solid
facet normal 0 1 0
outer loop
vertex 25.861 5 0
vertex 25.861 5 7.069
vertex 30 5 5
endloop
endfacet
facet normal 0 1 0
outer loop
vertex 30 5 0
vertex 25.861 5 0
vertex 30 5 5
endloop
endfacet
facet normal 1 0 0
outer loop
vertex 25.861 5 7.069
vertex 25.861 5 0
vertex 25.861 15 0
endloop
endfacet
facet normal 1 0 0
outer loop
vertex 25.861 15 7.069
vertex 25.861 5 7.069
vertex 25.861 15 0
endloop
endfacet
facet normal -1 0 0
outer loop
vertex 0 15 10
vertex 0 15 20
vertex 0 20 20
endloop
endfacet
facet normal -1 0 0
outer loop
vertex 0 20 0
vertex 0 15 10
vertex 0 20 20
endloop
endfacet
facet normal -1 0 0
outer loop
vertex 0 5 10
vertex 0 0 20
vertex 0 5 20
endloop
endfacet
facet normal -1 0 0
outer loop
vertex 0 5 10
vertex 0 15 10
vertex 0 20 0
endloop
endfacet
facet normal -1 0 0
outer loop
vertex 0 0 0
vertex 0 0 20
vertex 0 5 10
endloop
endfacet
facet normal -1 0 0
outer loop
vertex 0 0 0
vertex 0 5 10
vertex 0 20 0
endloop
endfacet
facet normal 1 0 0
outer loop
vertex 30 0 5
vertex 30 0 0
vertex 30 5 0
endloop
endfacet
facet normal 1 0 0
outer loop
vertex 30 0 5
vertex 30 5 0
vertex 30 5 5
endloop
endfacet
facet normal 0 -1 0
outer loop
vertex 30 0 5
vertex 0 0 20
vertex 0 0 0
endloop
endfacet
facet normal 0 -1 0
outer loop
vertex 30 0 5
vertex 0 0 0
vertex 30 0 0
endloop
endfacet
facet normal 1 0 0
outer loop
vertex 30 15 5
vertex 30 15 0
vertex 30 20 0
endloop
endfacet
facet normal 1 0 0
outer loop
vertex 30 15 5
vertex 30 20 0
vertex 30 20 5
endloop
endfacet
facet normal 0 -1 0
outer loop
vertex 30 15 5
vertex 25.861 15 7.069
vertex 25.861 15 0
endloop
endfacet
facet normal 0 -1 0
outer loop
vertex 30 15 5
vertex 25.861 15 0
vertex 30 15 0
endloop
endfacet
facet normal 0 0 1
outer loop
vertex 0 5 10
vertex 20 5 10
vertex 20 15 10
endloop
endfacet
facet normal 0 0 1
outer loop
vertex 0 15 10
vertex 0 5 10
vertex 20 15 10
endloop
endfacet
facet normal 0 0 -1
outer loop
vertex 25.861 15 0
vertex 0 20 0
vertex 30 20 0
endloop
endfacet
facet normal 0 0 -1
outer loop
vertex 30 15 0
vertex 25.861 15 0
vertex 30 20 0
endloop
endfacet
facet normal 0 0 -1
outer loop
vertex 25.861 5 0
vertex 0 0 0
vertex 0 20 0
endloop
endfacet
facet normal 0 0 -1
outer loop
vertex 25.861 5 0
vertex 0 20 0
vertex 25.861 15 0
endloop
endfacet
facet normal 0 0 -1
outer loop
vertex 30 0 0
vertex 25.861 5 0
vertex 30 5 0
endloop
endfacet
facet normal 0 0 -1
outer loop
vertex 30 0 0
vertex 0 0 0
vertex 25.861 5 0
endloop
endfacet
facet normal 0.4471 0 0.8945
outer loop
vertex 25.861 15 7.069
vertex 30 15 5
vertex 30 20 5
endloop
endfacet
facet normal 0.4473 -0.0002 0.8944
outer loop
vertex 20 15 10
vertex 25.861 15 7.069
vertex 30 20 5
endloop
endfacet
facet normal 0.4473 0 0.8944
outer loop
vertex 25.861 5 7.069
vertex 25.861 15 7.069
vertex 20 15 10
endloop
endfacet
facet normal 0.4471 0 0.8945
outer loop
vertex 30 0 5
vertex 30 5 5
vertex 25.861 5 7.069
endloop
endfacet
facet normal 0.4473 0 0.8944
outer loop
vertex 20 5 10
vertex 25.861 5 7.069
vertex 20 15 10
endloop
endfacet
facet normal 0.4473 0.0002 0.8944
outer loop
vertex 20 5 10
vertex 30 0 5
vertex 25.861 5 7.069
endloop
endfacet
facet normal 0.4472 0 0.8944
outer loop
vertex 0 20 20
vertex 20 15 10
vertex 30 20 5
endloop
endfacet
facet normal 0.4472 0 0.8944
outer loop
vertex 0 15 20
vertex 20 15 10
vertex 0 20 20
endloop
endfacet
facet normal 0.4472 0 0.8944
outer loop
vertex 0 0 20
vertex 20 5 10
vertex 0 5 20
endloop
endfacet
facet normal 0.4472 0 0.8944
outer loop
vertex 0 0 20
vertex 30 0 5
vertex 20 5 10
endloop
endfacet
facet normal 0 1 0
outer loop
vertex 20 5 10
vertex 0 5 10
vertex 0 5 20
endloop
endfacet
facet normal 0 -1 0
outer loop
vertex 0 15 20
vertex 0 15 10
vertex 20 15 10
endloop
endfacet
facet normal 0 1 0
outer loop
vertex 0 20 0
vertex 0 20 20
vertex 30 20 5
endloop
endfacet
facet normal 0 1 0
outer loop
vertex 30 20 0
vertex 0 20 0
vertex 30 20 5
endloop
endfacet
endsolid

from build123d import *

# Parameters (mm, degrees)
F1_DEPTH = 20
F2_W     = 10
F2_H     = 10
F3_DEPTH = 25
F4_W     = 4.138582
F4_H     = 10
F5_DEPTH = 25


with BuildPart() as f1:
    # F0 (on Front) → F1 (new body)
    with BuildSketch(Plane.XZ):
        Polygon((0, 20), (0, 0), (30, 0), (30, 5), align=None)
    extrude(amount=-F1_DEPTH)

    # F2 (on Right) → F3 (cut)
    with BuildSketch(Plane.YZ):
        with Locations((10, 15)):
            Rectangle(F2_W, F2_H)
    extrude(amount=F3_DEPTH, mode=Mode.SUBTRACT)

    # F4 (on Top) → F5 (cut)
    with BuildSketch(Plane.XY):
        with Locations((27.930709, 10)):
            Rectangle(F4_W, F4_H)
    extrude(amount=F5_DEPTH, mode=Mode.SUBTRACT)


solid = f1.part
